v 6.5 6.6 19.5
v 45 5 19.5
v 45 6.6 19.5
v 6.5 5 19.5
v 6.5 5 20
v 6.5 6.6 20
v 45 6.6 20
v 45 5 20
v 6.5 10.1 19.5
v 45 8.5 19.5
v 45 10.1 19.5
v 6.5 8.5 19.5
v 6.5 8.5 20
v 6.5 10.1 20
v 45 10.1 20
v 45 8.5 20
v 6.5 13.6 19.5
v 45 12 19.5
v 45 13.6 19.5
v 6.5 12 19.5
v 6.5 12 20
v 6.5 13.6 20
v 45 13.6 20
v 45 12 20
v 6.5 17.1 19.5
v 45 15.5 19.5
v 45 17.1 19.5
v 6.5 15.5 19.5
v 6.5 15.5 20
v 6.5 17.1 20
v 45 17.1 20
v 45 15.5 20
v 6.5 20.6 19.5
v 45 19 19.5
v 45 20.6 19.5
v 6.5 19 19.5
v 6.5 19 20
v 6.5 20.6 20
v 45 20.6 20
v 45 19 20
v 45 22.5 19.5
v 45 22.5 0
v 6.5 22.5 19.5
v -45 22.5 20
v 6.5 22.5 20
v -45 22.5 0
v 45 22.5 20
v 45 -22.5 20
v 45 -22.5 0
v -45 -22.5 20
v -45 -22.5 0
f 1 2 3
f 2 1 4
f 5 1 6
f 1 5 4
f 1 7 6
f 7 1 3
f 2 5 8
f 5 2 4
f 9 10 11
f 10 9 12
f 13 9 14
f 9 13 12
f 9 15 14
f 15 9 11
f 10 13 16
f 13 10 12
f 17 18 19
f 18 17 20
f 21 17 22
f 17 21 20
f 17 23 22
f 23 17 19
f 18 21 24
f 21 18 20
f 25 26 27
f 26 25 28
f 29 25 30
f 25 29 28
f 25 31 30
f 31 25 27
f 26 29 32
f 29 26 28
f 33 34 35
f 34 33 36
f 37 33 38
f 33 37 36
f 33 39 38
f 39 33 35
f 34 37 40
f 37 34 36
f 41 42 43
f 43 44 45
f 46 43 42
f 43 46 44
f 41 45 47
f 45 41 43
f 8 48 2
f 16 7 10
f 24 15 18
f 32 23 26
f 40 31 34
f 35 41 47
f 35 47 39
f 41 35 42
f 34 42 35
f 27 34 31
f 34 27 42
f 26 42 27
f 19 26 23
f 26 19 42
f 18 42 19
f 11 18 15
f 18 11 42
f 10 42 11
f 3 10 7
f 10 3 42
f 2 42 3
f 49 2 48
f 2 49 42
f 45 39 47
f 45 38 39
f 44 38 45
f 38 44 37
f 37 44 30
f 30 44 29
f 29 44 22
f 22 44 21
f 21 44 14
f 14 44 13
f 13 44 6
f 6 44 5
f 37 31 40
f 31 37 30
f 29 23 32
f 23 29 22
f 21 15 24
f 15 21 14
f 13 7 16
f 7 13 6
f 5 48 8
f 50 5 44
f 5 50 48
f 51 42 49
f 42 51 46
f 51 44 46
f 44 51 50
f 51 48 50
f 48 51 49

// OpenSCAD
// Drying rack for 10 microscope slides, standing upright on their long edge
// Print orientation: base block rests on XY plane, slots open at top (+Z)

$fn = 64;

// ---- Block dimensions ----
block_x = 90;        // block length (X)
block_y = 45;        // block width (Y)
block_z = 20;        // block height (Z)

// ---- Slot dimensions ----
slot_n     = 10;     // number of slots
slot_len   = 77;     // slot length along X
slot_w     = 1.6;    // slot width along Y
slot_depth = 10;     // slot depth from top face

// ---- Slot spacing ----
slot_pitch = 3.5;    // centre-to-centre spacing (Y)

// ---- Cut clearance ----
eps = 0.5;           // overshoot past top face

// Slot group width
group_w = slot_n * slot_pitch;

// Position the group so it is centred on the block in X and Y
group_x0 = block_x / 2 - slot_len / 2;
group_y0 = block_y / 2 - group_w / 2;

difference() {
    // Solid base block, centred in X/Y, sitting on z = 0
    translate([-block_x / 2, -block_y / 2, 0])
        cube([block_x, block_y, block_z]);

    // 10 parallel slots, open at top
    for (i = [0 : slot_n - 1])
        translate([group_x0, group_y0 + i * slot_pitch, block_z - eps])
            cube([slot_len, slot_w, slot_depth + eps]);
}
